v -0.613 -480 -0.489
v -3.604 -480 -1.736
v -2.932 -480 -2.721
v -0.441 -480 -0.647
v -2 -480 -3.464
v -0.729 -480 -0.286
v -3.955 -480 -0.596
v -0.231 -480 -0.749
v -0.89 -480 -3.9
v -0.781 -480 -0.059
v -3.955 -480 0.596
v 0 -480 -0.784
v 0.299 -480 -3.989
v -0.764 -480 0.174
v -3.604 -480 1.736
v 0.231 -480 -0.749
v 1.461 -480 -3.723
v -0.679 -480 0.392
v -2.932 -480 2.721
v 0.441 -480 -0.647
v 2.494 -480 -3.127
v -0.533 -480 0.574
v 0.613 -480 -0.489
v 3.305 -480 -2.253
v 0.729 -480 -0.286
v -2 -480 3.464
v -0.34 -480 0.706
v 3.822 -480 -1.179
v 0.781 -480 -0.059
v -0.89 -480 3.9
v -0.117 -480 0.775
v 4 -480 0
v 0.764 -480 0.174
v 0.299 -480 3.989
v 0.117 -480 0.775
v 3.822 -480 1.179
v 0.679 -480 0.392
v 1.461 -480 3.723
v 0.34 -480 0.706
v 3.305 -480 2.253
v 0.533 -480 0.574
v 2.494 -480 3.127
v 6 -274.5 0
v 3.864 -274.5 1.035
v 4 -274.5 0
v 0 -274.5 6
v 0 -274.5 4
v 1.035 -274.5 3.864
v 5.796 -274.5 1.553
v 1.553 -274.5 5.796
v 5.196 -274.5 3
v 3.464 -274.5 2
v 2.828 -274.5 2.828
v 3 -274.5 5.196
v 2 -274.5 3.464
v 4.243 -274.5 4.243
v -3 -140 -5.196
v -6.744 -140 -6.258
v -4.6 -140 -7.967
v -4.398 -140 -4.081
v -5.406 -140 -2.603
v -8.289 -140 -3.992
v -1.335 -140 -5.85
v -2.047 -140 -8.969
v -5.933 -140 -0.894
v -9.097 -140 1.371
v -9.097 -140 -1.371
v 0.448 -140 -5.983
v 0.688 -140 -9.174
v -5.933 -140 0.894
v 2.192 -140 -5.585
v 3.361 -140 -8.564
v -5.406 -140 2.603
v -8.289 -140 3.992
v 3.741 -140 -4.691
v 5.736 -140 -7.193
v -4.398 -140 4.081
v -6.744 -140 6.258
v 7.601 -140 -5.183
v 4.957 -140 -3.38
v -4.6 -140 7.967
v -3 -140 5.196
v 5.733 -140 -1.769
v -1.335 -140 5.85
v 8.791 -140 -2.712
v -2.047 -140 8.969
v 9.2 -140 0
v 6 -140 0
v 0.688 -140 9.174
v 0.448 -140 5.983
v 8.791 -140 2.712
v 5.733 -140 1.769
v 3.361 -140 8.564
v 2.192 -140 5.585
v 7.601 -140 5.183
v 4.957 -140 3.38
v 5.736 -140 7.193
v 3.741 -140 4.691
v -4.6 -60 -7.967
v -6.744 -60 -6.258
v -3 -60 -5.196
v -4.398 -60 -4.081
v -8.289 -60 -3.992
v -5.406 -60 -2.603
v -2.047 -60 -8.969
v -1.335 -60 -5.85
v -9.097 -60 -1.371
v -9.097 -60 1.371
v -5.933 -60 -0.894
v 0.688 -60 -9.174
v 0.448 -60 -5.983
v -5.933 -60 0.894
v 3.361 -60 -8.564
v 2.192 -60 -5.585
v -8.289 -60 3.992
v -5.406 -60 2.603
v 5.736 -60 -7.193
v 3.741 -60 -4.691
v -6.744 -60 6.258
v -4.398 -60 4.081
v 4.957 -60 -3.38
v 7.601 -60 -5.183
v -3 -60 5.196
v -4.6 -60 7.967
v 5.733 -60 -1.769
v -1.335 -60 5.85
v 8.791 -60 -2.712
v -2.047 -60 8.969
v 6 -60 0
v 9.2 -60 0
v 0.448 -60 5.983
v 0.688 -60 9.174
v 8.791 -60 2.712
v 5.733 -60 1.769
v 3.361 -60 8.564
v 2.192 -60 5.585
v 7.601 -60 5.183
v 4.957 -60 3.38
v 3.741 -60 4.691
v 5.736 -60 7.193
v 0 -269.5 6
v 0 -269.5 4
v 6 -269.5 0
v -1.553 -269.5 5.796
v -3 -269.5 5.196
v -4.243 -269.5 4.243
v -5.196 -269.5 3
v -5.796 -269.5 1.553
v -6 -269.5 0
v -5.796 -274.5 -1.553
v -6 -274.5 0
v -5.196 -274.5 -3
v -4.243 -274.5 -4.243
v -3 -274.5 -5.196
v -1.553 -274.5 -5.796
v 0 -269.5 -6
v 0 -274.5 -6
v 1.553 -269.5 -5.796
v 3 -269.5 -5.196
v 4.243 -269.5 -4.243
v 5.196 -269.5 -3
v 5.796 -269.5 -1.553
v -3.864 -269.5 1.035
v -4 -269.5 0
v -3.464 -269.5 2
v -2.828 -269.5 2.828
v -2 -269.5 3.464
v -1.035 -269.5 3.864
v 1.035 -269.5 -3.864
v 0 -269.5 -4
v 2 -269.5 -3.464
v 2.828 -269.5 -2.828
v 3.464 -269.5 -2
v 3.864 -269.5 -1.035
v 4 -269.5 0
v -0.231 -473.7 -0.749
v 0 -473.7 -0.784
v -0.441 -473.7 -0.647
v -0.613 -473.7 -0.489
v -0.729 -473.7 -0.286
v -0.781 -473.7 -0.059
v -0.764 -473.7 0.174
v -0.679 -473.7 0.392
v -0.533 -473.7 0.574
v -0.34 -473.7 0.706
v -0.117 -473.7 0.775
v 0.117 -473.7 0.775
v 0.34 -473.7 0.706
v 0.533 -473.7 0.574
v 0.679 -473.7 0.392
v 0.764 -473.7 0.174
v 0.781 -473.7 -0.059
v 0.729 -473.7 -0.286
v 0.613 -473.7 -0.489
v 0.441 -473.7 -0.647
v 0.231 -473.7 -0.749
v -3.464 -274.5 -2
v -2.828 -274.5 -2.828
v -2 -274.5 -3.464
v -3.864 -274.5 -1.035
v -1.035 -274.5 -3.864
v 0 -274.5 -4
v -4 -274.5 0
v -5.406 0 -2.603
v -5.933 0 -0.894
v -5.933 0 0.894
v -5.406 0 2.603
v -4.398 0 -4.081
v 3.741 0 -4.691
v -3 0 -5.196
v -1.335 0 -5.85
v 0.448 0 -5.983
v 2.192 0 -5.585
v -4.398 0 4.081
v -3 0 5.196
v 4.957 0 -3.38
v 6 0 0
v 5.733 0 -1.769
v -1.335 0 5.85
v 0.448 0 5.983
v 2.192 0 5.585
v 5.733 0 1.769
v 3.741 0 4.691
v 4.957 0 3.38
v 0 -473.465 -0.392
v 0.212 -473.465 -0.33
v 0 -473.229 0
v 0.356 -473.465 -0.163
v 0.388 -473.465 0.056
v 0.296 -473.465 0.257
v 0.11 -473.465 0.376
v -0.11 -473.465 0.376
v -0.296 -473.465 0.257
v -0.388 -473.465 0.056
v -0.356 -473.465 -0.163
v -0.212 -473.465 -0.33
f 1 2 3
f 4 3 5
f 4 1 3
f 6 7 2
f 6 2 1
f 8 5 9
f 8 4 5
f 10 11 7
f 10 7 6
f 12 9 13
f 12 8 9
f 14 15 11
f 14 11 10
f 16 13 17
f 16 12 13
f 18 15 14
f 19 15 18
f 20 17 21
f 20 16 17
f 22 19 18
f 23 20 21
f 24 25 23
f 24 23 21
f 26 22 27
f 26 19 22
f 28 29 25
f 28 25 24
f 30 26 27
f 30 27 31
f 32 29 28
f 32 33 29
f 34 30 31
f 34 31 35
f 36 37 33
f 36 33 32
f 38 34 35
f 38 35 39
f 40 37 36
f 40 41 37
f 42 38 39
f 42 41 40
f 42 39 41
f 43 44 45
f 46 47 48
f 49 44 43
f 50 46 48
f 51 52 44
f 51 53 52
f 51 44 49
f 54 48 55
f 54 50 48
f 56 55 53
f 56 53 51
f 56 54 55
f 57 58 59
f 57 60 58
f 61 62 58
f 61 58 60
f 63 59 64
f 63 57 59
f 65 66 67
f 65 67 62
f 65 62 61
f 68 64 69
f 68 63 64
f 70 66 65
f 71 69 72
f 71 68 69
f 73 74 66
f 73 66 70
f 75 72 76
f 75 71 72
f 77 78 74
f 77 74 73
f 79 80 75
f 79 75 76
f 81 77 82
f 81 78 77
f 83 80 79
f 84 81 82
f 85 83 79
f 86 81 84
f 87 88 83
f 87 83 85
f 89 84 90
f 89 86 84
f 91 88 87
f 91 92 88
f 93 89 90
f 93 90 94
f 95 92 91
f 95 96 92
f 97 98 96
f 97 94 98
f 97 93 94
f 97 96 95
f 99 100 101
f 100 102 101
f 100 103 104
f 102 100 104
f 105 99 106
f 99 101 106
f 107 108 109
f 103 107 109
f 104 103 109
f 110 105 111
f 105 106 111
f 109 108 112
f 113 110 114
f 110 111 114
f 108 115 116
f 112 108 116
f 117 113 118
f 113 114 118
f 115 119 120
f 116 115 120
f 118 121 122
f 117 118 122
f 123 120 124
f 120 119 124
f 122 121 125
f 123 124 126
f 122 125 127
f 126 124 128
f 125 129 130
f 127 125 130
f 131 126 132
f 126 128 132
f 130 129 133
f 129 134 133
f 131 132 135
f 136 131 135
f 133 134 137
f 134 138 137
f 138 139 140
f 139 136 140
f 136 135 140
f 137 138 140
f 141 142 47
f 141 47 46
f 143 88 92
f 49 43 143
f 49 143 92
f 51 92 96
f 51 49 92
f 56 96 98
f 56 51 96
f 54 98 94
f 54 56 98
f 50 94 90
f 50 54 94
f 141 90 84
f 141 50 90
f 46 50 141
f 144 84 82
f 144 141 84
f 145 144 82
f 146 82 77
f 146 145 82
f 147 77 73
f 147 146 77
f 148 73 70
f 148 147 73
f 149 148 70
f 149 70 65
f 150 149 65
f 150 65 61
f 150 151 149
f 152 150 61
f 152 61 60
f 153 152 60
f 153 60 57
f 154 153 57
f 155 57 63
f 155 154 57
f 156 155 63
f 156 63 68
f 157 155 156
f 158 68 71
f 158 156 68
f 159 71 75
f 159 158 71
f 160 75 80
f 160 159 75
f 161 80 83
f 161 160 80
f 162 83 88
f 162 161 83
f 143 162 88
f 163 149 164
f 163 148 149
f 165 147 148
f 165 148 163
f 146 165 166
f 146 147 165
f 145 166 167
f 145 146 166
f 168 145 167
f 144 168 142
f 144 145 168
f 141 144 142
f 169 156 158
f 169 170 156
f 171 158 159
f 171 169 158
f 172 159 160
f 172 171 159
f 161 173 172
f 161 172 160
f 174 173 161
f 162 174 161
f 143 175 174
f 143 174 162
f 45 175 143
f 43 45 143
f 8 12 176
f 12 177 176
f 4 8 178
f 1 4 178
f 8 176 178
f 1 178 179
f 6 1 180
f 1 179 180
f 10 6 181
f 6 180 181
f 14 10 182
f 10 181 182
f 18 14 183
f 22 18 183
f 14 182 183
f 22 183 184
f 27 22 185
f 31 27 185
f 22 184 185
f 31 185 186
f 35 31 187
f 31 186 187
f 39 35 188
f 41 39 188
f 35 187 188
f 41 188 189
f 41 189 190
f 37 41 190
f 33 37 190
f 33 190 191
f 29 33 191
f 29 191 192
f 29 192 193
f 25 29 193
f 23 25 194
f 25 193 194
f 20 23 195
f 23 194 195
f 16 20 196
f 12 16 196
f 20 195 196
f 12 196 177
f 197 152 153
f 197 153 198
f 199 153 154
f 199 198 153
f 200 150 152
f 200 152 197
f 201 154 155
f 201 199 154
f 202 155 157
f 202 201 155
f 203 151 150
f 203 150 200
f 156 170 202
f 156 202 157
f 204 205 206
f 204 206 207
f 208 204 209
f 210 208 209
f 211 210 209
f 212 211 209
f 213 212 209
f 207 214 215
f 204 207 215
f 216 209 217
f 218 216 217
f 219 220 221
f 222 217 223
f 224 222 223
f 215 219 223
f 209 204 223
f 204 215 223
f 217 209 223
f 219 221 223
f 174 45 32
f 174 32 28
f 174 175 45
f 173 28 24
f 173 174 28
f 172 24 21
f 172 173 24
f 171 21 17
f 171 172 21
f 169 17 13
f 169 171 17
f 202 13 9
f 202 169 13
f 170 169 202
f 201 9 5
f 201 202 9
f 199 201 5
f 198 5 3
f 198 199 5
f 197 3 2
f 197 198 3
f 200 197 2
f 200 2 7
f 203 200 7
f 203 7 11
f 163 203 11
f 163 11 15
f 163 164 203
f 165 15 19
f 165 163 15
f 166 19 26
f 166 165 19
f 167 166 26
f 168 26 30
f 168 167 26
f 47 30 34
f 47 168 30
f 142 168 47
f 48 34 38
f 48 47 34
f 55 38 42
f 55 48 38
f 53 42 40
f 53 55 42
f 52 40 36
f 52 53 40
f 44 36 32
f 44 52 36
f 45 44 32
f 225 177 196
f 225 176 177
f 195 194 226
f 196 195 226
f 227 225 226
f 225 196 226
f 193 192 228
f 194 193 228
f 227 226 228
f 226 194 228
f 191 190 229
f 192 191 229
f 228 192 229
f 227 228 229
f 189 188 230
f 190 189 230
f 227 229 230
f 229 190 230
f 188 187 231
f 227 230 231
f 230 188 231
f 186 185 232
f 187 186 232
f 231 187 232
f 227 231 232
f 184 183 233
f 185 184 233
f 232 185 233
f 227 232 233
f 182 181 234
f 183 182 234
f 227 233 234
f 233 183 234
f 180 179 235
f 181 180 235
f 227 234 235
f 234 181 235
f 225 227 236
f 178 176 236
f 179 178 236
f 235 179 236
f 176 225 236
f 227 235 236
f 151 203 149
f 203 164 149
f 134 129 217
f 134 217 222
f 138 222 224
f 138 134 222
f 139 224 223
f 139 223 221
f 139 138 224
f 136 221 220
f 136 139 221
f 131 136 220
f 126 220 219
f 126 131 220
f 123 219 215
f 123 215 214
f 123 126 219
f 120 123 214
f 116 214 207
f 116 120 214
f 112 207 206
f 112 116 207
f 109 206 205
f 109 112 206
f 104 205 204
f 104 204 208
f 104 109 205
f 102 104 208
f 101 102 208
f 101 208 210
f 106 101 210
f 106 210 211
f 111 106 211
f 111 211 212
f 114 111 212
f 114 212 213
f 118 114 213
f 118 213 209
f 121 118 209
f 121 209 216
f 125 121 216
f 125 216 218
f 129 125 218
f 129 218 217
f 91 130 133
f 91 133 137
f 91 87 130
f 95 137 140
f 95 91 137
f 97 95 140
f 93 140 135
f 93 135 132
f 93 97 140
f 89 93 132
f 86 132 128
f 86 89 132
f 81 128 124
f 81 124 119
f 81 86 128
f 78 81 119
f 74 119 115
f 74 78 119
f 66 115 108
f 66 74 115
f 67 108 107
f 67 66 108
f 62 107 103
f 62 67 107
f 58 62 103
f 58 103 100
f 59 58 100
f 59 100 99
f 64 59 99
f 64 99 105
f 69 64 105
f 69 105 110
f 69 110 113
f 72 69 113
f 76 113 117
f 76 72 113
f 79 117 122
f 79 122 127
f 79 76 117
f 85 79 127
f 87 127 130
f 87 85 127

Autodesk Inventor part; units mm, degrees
ref_plane "YZ Plane" through (0, 0, 0) normal (1, 0, 0) x (0, 1, 0)
ref_plane "XZ Plane" through (0, 0, 0) normal (0, 1, 0) x (-1, 0, 0)
ref_plane "XY Plane" through (0, 0, 0) normal (0, 0, 1) x (1, 0, 0)
sketch "Sketch1" plane through (0, 0, 0) normal (0, 0, 1) x (1, 0, 0)
  line L0 (0, 0) -> (0, -500) construction
  line L1 (0, 0) -> (6, 0)
  line L2 (6, 0) -> (6, -60)
  line L3 (6, -60) -> (9.2, -60)
  line L4 (9.2, -60) -> (9.2, -140)
  line L5 (9.2, -140) -> (6, -140)
  line L6 (6, -140) -> (6, -269.5)
  line L7 (0, 0) -> (0, -480)
  line L8 (0, 0) -> (0, 9) construction
  line L9 (4, -480) -> (4, -269.5)
  line L10 (4, -269.5) -> (6, -269.5)
  line L11 (4, -480) -> (0, -480)
  dimension "d1" = 12
  dimension "d2" = 60
  dimension "d3" = 18.4
  dimension "d4" = 80
  dimension "d7" = 8
  dimension "d8" = 210.5
  dimension "d9" = 480
revolve "Revolution1" add sketch "Sketch1" angle 360 about axis through (0, 0, 0) along (0, -1, 0)
sketch "Sketch2" plane through (0, -269.5, 0) normal (0, -1, 0) x (1, 0, 0)
  line L0 (0, 0) -> (0, 10.7217) construction
  line L1 (0, 0) -> (0, -10) construction
  line L2 (0, 0) -> (-12.4689, 0) construction
  line L3 (0, 0) -> (11.6918, 0) construction
  circle A0 centre (0, 0) radius 6 construction
  arc A1 (6, 0) -> (0, 6) centre (0, 0) ccw
  arc A2 (-6, 0) -> (0, -6) centre (0, 0) ccw
  arc A3 (4, 0) -> (0, 4) centre (0, 0) ccw
  arc A4 (-4, 0) -> (0, -4) centre (0, 0) ccw
  line L4 (-4, 0) -> (-6, 0)
  line L5 (0, -4) -> (0, -6)
  line L6 (0, 4) -> (0, 6)
  line L7 (4, 0) -> (6, 0)
  dimension "d10" = 4
  dimension "d11" = 4
extrude "Extrusion1" add sketch "Sketch2" along normal blind 5
sketch "Sketch3" plane through (0, -480, 0) normal (0, -1, 0) x (1, 0, 0)
  point P0 (0, 0)
  point P1 (0, 0)
hole "Hole1" at (0, -480, 0) direction (0, 1, 0) diameter 1.567 depth 6.3 tip angle 118 thread size "M2x0.4" class "6H" standard "ANSI Metric M Profile"
sketch "Sketch4" plane through (0, -480, 0) normal (0, -1, 0) x (1, 0, 0)
  point P0 (0, 0)
sketch "Sketch6" plane through (0, -480, 0) normal (0, -1, 0) x (1, 0, 0)
  point P0 (0, 0)
properties part number "Achse"
